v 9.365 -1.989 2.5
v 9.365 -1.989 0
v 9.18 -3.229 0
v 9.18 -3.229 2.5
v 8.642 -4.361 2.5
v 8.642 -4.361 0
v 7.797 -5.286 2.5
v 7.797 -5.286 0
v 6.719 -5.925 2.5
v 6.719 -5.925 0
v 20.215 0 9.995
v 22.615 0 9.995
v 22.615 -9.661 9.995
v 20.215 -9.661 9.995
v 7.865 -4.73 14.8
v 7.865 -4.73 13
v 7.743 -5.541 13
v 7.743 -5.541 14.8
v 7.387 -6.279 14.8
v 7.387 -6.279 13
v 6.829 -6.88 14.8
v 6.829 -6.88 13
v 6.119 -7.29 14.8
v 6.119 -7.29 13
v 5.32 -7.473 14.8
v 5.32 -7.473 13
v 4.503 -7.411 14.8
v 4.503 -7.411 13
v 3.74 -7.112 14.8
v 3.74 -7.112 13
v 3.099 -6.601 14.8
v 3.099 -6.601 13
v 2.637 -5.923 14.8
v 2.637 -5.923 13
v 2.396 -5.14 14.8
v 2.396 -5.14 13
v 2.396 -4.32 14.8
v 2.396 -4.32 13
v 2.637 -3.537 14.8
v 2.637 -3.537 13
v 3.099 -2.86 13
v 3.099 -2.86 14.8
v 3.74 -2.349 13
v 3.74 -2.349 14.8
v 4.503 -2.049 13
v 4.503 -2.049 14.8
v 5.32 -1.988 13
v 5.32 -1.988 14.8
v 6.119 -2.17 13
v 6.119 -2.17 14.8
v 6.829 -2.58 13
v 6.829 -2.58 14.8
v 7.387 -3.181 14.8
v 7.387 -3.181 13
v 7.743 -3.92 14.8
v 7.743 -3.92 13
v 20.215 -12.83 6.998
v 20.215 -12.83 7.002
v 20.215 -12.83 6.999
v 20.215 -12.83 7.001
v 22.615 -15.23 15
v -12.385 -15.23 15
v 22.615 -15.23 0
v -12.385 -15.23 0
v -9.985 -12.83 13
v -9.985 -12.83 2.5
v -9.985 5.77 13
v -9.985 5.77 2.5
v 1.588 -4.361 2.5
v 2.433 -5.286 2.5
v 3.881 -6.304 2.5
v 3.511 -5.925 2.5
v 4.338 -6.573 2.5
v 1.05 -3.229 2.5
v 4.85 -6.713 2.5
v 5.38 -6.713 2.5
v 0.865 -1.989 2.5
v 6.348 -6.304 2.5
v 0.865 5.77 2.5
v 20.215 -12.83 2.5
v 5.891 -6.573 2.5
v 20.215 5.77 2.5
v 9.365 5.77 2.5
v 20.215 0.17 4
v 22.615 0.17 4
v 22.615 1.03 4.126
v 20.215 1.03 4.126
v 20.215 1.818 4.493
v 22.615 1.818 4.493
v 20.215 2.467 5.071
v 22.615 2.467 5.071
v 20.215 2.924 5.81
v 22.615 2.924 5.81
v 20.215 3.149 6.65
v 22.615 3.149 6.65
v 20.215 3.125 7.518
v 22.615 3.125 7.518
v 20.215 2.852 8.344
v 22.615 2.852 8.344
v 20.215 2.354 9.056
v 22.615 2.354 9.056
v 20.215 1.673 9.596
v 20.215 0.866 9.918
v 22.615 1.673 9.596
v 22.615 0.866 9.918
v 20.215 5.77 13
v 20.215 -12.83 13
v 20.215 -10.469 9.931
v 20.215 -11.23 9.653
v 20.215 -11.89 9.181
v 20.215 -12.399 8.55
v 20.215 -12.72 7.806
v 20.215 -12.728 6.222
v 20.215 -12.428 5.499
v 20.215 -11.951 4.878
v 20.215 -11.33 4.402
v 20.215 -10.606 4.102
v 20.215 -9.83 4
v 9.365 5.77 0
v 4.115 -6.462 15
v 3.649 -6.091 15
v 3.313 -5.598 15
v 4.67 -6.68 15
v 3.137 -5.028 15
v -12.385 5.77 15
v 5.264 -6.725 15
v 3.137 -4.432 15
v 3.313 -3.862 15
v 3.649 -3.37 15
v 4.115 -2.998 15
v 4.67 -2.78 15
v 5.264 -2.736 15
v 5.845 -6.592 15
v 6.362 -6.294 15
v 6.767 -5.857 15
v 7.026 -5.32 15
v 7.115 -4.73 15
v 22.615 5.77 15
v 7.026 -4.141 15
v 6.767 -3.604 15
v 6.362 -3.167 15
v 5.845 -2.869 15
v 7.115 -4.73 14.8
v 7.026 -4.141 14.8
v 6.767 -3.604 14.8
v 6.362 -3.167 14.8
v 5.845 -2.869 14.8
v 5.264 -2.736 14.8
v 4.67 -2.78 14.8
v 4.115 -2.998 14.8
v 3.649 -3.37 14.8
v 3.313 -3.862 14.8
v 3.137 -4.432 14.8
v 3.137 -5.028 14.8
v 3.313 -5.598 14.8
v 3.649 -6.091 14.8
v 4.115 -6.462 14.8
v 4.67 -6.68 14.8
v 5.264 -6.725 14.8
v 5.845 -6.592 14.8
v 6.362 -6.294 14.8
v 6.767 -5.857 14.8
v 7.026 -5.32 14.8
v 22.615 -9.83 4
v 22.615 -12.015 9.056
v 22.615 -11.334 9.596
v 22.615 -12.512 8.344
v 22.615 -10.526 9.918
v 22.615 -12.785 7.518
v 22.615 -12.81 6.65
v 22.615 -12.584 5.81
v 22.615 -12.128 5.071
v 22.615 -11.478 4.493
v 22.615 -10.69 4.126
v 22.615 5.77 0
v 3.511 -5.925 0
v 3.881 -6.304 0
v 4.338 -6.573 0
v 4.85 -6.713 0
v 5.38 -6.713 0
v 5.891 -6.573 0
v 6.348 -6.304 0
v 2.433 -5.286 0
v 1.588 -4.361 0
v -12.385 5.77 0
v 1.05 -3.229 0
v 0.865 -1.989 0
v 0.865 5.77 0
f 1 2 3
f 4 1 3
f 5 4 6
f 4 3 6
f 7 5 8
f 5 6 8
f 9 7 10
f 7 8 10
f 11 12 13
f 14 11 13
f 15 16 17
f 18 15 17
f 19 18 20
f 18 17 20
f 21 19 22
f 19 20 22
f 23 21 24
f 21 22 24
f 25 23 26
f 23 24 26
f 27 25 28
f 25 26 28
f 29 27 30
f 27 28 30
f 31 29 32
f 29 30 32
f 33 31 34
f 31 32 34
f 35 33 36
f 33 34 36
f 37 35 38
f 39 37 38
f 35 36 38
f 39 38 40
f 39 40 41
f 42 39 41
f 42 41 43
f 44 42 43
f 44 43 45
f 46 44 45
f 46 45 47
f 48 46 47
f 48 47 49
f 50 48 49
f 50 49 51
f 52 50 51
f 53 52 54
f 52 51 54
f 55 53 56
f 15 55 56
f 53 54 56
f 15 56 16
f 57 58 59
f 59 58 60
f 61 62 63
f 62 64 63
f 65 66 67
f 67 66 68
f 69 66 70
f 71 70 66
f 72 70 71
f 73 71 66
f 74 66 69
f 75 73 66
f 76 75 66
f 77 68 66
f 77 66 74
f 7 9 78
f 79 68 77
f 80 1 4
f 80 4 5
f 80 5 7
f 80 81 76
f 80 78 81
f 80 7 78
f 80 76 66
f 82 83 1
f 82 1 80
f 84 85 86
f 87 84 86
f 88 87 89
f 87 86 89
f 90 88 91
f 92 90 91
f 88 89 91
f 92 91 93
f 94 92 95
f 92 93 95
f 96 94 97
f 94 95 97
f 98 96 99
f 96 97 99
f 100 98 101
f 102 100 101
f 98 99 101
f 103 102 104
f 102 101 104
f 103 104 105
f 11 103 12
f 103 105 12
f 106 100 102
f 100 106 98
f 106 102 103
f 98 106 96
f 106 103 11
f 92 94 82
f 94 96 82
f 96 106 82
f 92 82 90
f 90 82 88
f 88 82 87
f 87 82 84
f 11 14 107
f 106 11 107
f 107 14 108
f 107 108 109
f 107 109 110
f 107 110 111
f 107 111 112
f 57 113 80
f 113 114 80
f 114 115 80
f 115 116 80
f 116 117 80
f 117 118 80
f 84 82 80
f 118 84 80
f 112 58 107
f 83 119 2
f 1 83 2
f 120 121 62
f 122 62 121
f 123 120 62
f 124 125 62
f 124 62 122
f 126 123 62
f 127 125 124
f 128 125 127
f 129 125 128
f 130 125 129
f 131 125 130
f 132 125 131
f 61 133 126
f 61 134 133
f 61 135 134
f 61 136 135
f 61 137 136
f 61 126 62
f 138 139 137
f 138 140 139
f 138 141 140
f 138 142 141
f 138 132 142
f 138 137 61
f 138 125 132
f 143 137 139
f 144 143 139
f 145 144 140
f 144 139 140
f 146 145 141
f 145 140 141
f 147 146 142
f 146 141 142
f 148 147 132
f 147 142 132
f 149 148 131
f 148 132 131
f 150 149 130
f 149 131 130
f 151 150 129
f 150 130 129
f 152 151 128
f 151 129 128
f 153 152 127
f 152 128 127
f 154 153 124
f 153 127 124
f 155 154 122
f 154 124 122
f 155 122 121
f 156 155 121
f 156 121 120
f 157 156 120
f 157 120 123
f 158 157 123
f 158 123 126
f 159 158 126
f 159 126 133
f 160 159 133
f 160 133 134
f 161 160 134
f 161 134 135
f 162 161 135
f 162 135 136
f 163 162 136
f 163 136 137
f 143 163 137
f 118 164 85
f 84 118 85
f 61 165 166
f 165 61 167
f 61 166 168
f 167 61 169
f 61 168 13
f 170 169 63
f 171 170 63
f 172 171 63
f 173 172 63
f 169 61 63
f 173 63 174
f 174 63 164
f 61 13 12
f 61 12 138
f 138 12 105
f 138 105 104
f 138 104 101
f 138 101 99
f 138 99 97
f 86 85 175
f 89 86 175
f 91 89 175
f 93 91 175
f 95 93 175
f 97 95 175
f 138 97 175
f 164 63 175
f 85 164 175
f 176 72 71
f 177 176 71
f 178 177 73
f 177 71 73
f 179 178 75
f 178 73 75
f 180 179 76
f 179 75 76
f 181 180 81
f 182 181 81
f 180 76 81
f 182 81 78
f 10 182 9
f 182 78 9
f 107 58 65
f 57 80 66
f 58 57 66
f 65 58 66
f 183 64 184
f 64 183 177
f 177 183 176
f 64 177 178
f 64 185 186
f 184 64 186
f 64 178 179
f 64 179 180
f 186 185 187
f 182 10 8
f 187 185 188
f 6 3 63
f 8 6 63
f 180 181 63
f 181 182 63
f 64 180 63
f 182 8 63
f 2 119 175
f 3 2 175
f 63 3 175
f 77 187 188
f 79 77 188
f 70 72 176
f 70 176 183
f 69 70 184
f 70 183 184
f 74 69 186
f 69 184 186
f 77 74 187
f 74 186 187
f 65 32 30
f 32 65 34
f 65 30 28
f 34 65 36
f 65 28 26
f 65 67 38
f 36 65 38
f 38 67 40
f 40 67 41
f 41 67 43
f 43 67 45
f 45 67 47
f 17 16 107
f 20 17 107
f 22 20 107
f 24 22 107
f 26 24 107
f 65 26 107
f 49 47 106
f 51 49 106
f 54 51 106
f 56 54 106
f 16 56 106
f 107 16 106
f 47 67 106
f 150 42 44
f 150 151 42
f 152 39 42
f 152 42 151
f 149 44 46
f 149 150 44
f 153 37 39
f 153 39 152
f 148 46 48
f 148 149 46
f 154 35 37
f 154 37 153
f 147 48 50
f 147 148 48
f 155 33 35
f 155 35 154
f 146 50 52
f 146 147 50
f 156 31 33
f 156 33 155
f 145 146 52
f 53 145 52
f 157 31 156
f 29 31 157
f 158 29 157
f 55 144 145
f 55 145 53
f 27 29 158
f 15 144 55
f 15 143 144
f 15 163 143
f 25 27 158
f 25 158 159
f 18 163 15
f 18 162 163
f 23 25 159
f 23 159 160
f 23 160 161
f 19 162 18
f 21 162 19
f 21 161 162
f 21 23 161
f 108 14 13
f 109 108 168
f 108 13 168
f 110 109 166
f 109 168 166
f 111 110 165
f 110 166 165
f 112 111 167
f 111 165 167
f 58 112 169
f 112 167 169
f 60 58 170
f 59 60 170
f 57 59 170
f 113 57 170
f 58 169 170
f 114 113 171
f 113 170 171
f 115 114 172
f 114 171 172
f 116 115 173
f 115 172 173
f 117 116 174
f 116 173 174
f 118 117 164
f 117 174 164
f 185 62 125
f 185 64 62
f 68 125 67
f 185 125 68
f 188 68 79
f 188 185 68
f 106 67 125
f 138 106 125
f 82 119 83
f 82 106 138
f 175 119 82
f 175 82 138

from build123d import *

# Parameters (mm, degrees)
F1_DEPTH  = 2.5
F3_DEPTH  = 10.5
F4_W      = 35
F4_H      = 21
F5_DEPTH  = 2
F7_DEPTH  = 2.4
F8_R      = 2
F9_DEPTH  = 25
F10_R     = 2.75
F11_DEPTH = 1.8


with BuildPart() as f1:
    # F0 (on Top) → F1 (new body)
    with BuildSketch(Plane.XY):
        with BuildLine():
            Line((0.864788, 5.76975), (-12.385212, 5.76975))
            Line((-12.385212, 5.76975), (-12.385212, -15.23025))
            Line((-12.385212, -15.23025), (22.614788, -15.23025))
            Line((22.614788, -15.23025), (22.614788, 5.76975))
            Line((22.614788, 5.76975), (9.364788, 5.76975))
            Line((9.364788, 5.76975), (9.364788, -1.989312))
            ThreePointArc((9.364788, -1.989312), (5.114788, -6.239312), (0.864788, -1.989312))
            Line((0.864788, -1.989312), (0.864788, 5.76975))
        make_face()
    extrude(amount=F1_DEPTH)

    # F2 (on face) → F3 (join)
    with BuildSketch(Plane.XY.offset(2.5)):
        Polygon((-9.985212, 5.76975), (-12.385212, 5.76975), (-12.385212, -15.23025), (22.614788, -15.23025), (22.614788, 5.76975), (20.214788, 5.76975), (20.214788, -12.83025), (-9.985212, -12.83025), align=None)
    extrude(amount=F3_DEPTH)

    # F4 (on face) → F5 (join)
    with BuildSketch(Plane.XY.offset(13)):
        with Locations((5.114788, -4.73025)):
            Rectangle(F4_W, F4_H)
    extrude(amount=F5_DEPTH)

    # F6 (on face) → F7 (cut)
    with BuildSketch(Plane.YZ.offset(22.614788)):
        with BuildLine():
            Line((-9.83025, 4), (0.16975, 4))
            ThreePointArc((0.16975, 4), (3.168548, 7.084909), (0, 9.995194))
            Line((0, 9.995194), (-9.660501, 9.995194))
            ThreePointArc((-9.660501, 9.995194), (-12.829049, 7.084909), (-9.83025, 4))
        make_face()
    extrude(amount=-F7_DEPTH, mode=Mode.SUBTRACT)

    # F8 (on face) → F9 (cut)
    with BuildSketch(Plane.XY.offset(15)):
        with Locations((5.114788, -4.73025)):
            Circle(F8_R)
    extrude(amount=-F9_DEPTH, mode=Mode.SUBTRACT)

    # F10 (on face) → F11 (cut)
    with BuildSketch(Plane(origin=(0, 0, 13), x_dir=(1, 0, 0), z_dir=(0, 0, -1))):
        with Locations((5.114788, 4.73025)):
            Circle(F10_R)
    extrude(amount=-F11_DEPTH, mode=Mode.SUBTRACT)


solid = f1.part
